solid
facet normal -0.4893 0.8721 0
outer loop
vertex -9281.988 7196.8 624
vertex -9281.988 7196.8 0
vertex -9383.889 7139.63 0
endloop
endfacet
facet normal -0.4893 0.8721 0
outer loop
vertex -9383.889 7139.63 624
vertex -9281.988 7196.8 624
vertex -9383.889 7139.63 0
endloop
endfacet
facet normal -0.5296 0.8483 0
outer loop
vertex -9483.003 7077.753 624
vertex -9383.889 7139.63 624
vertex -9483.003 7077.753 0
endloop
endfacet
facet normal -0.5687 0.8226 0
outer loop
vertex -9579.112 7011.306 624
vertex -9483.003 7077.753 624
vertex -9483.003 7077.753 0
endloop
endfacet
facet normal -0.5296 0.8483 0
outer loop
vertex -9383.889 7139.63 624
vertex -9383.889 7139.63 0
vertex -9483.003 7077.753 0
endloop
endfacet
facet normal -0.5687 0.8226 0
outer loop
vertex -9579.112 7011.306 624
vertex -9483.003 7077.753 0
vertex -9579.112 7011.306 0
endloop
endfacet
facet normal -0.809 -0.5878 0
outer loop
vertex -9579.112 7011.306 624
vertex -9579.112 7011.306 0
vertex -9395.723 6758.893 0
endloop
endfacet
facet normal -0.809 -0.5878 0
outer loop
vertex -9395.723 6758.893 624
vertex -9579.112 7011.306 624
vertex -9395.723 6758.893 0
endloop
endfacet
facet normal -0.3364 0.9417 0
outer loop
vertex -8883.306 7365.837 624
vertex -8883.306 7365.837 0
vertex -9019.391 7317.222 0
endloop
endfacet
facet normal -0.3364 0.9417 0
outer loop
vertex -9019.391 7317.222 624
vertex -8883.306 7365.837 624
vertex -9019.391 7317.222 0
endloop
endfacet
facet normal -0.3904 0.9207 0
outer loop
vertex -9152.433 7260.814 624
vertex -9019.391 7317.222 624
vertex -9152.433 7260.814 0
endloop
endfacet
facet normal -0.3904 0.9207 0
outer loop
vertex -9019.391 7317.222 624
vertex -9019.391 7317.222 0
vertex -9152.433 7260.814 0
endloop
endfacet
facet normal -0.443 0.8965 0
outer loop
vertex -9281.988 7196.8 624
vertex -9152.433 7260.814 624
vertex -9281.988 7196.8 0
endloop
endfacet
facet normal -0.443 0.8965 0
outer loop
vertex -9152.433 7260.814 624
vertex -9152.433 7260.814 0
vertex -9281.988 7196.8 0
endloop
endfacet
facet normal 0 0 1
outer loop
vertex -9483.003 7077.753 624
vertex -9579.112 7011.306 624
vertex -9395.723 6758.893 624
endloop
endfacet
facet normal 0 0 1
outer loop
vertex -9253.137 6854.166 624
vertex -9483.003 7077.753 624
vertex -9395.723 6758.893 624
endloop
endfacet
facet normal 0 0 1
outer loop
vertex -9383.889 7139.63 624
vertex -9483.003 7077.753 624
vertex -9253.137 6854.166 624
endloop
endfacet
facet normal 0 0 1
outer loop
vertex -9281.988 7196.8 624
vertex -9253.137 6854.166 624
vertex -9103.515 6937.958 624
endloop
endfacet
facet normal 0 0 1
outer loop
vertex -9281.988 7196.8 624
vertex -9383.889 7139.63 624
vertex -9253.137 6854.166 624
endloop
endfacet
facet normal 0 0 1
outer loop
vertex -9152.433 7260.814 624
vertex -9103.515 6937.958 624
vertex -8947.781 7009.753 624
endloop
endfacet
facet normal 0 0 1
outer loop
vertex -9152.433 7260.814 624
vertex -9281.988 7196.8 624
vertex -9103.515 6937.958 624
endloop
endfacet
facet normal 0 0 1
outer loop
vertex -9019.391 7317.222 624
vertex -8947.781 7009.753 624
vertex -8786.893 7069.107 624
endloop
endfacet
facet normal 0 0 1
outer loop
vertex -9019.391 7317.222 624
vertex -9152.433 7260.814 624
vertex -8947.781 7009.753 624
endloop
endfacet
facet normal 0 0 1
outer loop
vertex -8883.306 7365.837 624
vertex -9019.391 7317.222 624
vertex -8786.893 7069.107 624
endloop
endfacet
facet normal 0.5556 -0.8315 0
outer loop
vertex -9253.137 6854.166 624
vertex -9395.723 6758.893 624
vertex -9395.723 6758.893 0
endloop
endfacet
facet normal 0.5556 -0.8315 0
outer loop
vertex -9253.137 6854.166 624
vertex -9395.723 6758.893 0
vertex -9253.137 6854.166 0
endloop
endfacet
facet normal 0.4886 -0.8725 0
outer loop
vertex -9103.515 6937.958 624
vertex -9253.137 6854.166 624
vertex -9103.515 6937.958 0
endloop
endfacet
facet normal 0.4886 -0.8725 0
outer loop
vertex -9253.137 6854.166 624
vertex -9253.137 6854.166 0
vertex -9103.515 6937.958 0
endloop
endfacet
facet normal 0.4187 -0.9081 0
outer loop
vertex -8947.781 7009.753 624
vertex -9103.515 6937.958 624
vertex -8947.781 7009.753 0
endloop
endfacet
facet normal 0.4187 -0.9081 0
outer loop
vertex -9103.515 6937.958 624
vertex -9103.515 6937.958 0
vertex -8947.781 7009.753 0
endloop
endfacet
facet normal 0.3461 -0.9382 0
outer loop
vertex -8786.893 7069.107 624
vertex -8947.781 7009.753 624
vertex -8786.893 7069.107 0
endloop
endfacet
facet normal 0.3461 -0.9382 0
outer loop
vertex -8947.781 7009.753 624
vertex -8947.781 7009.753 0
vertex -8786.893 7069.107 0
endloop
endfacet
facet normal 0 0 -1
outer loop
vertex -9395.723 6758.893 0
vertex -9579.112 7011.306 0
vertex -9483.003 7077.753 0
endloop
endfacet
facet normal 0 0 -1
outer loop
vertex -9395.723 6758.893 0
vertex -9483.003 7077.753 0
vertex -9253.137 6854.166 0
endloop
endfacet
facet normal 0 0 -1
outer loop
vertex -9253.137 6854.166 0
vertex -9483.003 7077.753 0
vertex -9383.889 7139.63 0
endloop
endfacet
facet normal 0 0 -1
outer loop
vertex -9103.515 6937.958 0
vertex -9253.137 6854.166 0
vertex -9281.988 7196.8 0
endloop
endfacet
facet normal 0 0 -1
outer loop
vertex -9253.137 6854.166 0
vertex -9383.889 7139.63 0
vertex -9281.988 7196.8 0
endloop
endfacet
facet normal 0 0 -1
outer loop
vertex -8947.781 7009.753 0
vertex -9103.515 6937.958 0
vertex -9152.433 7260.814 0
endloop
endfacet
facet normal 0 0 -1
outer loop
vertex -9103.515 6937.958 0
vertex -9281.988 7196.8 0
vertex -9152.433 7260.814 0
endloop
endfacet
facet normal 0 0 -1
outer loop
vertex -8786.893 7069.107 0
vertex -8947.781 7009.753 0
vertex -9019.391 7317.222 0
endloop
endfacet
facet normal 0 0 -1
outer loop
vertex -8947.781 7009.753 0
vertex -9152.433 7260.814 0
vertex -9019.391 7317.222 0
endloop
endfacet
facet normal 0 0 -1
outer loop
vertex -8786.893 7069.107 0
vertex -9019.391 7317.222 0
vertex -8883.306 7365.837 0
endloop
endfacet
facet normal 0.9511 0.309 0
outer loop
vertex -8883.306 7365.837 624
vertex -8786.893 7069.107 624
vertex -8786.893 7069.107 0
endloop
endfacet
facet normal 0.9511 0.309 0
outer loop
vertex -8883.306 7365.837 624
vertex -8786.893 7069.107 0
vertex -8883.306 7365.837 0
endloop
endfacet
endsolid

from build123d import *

# Parameters (mm, degrees)
EXTRUDE_1_DEPTH = 480
SCALE_1_SCALE   = 1.3


with BuildPart() as part:
    # 草图1 → 凸台-拉伸1 (new body)
    with BuildSketch(Plane.XY):
        with BuildLine():
            Line((-7368.547684402, 5393.3126292), (-7227.479223851, 5199.14855055))
            ThreePointArc((-7227.479223851, 5199.14855055), (-7002.704039562, 5336.890960636), (-6759.14855055, 5437.774947376))
            Line((-6759.14855055, 5437.774947376), (-6833.3126292, 5666.028511287))
            ThreePointArc((-6833.3126292, 5666.028511287), (-6989.477063432, 5607.677609574), (-7139.991111067, 5536))
            ThreePointArc((-7139.991111067, 5536), (-7256.775458313, 5468.670521429), (-7368.547684402, 5393.3126292))
        make_face()
    extrude(amount=EXTRUDE_1_DEPTH)


with BuildPart() as part_1:
    # 缩放比例1: scaled about (0, 0, 0)
    add(part.part.scale(SCALE_1_SCALE))


solid = part_1.part
